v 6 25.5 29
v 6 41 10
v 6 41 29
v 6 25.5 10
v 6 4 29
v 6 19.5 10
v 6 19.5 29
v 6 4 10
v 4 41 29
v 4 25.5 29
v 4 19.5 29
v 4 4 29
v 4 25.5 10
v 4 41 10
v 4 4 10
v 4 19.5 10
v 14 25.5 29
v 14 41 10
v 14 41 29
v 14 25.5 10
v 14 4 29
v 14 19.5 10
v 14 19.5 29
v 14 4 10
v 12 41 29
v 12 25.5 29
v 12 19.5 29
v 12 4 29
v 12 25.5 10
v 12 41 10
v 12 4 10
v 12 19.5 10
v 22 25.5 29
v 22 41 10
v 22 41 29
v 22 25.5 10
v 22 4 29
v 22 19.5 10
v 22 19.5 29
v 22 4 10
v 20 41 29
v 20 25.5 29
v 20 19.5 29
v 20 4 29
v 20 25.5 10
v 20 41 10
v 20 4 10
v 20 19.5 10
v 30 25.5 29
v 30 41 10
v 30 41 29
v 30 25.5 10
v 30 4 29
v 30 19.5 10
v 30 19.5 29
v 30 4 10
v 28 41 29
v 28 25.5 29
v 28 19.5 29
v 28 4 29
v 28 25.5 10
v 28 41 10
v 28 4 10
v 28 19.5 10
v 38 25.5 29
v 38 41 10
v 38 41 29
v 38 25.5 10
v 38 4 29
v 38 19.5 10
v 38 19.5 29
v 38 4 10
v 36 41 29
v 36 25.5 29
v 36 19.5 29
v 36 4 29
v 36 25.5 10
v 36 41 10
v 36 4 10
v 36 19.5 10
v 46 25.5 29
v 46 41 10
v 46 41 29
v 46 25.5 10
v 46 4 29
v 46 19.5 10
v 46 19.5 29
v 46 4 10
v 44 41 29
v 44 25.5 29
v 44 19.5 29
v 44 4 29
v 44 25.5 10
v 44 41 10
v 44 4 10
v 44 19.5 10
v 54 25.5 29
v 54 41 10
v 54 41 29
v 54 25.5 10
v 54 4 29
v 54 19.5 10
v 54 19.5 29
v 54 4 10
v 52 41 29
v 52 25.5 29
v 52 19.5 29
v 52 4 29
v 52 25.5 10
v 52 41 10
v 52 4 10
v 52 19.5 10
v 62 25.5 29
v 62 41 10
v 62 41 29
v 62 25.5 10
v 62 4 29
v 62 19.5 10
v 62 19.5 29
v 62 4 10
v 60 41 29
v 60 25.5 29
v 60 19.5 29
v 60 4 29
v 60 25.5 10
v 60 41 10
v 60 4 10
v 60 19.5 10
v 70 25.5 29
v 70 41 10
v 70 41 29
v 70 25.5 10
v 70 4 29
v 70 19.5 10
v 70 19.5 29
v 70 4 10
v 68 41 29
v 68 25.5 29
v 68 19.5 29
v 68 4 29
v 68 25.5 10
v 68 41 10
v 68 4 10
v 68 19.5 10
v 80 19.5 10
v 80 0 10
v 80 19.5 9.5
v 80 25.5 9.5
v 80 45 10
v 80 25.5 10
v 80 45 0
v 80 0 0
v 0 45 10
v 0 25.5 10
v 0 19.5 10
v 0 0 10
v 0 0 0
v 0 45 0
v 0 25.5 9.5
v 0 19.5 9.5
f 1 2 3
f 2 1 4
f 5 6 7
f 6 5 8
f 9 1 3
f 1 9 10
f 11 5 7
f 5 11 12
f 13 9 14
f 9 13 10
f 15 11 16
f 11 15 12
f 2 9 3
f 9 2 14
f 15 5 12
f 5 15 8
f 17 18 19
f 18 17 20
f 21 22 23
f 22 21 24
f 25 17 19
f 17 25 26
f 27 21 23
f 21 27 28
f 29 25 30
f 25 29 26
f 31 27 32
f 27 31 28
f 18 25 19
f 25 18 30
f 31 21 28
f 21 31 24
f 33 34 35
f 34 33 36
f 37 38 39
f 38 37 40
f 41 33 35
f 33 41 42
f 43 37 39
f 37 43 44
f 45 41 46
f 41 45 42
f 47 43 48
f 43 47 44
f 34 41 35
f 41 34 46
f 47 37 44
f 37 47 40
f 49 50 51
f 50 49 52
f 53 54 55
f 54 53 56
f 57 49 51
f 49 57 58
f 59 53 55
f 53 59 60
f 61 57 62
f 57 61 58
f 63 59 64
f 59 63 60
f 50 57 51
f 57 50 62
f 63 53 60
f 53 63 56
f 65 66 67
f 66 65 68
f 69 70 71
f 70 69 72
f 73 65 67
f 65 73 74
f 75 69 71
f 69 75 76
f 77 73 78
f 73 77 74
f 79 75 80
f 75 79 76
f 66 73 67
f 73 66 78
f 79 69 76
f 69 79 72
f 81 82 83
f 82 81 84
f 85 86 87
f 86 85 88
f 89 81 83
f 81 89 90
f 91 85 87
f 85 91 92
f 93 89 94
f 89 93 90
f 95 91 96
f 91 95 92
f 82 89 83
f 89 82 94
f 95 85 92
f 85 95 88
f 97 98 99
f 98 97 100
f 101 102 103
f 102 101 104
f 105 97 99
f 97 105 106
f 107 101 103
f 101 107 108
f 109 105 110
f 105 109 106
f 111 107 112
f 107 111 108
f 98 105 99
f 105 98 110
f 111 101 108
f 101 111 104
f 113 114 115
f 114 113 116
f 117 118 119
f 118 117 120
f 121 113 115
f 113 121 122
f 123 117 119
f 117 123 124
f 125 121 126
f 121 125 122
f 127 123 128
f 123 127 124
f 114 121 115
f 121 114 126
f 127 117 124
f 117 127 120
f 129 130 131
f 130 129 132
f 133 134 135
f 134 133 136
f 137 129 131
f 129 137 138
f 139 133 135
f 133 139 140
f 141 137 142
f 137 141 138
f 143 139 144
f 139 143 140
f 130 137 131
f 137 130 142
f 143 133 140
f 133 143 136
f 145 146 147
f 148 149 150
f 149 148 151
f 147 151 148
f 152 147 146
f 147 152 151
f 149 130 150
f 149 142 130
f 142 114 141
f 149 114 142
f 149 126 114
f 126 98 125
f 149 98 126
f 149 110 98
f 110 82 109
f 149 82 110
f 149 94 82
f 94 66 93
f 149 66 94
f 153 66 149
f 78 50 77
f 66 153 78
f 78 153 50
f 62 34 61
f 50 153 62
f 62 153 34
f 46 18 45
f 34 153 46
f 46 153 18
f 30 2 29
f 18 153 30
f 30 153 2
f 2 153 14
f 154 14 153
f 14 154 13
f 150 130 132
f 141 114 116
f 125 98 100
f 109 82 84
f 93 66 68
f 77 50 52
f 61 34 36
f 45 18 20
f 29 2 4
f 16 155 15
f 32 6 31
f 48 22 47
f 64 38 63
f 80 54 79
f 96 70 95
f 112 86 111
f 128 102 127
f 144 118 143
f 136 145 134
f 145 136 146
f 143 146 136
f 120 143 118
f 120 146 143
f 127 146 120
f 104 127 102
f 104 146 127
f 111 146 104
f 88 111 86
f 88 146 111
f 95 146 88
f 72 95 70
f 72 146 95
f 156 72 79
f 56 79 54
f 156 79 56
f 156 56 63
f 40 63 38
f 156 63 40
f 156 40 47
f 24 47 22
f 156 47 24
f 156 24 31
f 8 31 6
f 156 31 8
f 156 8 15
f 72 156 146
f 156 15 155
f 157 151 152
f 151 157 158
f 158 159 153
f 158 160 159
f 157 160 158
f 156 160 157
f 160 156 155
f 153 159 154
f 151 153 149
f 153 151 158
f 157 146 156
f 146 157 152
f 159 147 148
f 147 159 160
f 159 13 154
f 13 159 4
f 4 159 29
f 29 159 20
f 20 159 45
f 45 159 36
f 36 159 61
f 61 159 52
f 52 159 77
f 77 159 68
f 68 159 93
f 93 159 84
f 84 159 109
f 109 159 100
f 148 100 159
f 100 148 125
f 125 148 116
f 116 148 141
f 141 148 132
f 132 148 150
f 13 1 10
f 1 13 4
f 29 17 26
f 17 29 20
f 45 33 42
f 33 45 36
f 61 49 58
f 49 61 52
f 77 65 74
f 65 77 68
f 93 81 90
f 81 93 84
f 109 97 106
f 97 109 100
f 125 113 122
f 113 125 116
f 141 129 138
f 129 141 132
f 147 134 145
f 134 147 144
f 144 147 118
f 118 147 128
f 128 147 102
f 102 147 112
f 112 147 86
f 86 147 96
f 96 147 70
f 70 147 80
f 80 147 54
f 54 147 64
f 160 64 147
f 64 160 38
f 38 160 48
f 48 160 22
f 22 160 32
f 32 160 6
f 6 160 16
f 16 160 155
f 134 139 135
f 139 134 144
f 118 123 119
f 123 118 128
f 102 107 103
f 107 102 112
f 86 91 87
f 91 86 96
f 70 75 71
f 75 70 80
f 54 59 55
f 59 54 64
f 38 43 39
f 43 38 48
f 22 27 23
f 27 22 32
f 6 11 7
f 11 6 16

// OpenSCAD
$fn = 32;

// ----------------------------------------------------------------------
// Heatsink: slotted fin block
// ----------------------------------------------------------------------

// --- parameters (mm) ---
base_l = 80;              // base length, X
base_w = 45;              // base width, Y
base_t = 10;              // base plate thickness
fin_h = 20;               // fin height above the base
fin_t = 2;                // fin thickness
edge = 4;                 // margin from the base ends
pitch = 8;                // fin pitch
slot_w = 6;               // central slot width, Y

n_fins = floor((base_l - 2 * edge - fin_t) / pitch) + 1;  // fin count
total_h = base_t + fin_h - 1;  // overall height

difference() {
union() {
  cube([base_l, base_w, base_t]);
  for (i = [0 : n_fins - 1])
    translate([edge + i * pitch, edge, base_t - 1])
      cube([fin_t, base_w - 2 * edge, fin_h]);
}
  translate([-1, base_w / 2 - slot_w / 2, base_t - 0.5])
    cube([base_l + 2, slot_w, fin_h + 2]);
}
